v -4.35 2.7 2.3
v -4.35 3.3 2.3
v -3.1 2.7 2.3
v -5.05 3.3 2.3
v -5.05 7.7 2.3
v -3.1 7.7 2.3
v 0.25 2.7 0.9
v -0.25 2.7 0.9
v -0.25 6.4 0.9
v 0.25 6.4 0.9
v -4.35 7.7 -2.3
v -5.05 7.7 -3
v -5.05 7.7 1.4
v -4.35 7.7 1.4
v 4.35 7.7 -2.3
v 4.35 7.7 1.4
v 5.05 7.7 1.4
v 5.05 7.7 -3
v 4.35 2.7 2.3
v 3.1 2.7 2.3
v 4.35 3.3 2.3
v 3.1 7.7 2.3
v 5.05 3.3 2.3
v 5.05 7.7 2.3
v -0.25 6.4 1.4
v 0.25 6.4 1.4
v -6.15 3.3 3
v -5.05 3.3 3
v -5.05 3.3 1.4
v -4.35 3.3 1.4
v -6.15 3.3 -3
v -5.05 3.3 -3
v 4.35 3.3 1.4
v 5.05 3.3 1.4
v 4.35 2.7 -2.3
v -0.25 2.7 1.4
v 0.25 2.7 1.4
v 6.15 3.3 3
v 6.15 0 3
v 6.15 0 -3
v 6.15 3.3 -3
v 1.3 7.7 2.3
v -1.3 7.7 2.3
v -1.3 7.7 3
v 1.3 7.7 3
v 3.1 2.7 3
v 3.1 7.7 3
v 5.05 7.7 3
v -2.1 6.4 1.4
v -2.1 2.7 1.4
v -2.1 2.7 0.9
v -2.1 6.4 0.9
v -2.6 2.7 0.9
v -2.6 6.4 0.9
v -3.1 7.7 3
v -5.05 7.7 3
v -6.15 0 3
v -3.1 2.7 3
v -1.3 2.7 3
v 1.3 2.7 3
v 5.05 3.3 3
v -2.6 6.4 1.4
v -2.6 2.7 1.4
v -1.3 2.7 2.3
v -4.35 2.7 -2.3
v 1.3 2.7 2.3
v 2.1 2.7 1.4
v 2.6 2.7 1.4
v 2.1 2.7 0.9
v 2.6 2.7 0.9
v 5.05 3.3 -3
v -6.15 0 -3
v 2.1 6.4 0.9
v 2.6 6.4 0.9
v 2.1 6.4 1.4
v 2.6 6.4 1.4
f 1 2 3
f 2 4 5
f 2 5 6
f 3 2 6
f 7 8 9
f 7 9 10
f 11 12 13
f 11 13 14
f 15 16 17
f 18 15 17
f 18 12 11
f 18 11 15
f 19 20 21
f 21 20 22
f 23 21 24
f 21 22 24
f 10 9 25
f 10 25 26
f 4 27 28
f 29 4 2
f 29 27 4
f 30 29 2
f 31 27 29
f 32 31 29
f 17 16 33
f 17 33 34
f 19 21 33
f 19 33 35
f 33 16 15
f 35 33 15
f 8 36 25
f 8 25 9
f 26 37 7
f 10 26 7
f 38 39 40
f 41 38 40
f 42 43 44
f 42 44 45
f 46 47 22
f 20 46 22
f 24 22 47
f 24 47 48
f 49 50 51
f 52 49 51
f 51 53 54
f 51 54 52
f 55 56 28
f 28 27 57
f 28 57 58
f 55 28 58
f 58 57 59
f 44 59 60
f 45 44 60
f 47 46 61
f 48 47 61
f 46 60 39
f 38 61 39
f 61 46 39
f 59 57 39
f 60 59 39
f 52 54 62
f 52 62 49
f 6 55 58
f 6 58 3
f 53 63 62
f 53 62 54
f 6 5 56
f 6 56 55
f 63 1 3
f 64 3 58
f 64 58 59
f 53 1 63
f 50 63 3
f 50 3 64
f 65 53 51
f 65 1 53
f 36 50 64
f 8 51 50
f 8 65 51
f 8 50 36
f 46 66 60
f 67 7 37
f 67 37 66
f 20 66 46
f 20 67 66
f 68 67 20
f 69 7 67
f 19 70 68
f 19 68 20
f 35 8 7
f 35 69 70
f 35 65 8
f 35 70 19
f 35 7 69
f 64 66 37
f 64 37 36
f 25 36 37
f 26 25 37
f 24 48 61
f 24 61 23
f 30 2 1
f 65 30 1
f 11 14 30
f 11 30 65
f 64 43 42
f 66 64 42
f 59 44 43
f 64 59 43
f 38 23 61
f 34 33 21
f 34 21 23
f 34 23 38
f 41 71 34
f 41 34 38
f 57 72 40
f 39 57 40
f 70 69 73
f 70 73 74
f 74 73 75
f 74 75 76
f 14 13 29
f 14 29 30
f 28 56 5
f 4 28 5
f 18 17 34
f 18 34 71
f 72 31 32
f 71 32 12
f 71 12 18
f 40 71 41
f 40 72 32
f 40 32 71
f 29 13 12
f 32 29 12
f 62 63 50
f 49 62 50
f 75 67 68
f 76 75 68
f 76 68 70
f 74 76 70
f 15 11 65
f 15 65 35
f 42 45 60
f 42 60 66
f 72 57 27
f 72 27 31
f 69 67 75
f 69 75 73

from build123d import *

# Parameters (mm, degrees)
SKETCH1_W           = 12.3
SKETCH1_H           = 6
BOSS_EXTRUDE1_DEPTH = 7.7
SKETCH2_W           = 8.7
SKETCH2_H           = 4.6
CUT_EXTRUDE1_DEPTH  = 5
SKETCH3_W           = 1.1
SKETCH3_H           = 6
CUT_EXTRUDE2_DEPTH  = 4.4
SKETCH4_W           = 1.8
SKETCH4_H           = 0.7
CUT_EXTRUDE3_DEPTH  = 5
SKETCH5_W           = 10.1
SKETCH5_H           = 0.9
CUT_EXTRUDE4_DEPTH  = 4.4
SKETCH6_W           = 0.5
SKETCH6_H           = 0.5
BOSS_EXTRUDE2_DEPTH = 3.7


with BuildPart() as part:
    # Sketch1 → Boss-Extrude1 (new body)
    with BuildSketch(Plane(origin=(0, 0, 0), x_dir=(1, 0, 0), z_dir=(0, 1, 0))):
        Rectangle(SKETCH1_W, SKETCH1_H)
    extrude(amount=BOSS_EXTRUDE1_DEPTH)

    # Sketch2 → Cut-Extrude1 (cut)
    with BuildSketch(Plane(origin=(0, 7.7, 0), x_dir=(1, 0, 0), z_dir=(0, 1, 0))):
        Rectangle(SKETCH2_W, SKETCH2_H)
    extrude(amount=-CUT_EXTRUDE1_DEPTH, mode=Mode.SUBTRACT)

    # Sketch3 → Cut-Extrude2 (cut)
    with BuildSketch(Plane(origin=(0, 7.7, 0), x_dir=(1, 0, 0), z_dir=(0, 1, 0))):
        with Locations((-5.6, 0)):
            Rectangle(SKETCH3_W, SKETCH3_H)
        with Locations((5.6, 0)):
            Rectangle(SKETCH3_W, SKETCH3_H)
    extrude(amount=-CUT_EXTRUDE2_DEPTH, mode=Mode.SUBTRACT)

    # Sketch4 → Cut-Extrude3 (cut)
    with BuildSketch(Plane(origin=(0, 7.7, 0), x_dir=(1, 0, 0), z_dir=(0, 1, 0))):
        with Locations((-2.2, -2.65)):
            Rectangle(SKETCH4_W, SKETCH4_H)
        with Locations((2.2, -2.65)):
            Rectangle(SKETCH4_W, SKETCH4_H)
    extrude(amount=-CUT_EXTRUDE3_DEPTH, mode=Mode.SUBTRACT)

    # Sketch5 → Cut-Extrude4 (cut)
    with BuildSketch(Plane(origin=(0, 7.7, 0), x_dir=(1, 0, 0), z_dir=(0, 1, 0))):
        with Locations((0, -1.85)):
            Rectangle(SKETCH5_W, SKETCH5_H)
    extrude(amount=-CUT_EXTRUDE4_DEPTH, mode=Mode.SUBTRACT)

    # Sketch6 → Boss-Extrude2 (add)
    with BuildSketch(Plane(origin=(0, 2.7, 0), x_dir=(1, 0, 0), z_dir=(0, 1, 0))):
        with Locations((0, -1.15)):
            Rectangle(SKETCH6_W, SKETCH6_H)
        with Locations((-2.35, -1.15)):
            Rectangle(SKETCH6_W, SKETCH6_H)
        with Locations((2.35, -1.15)):
            Rectangle(SKETCH6_W, SKETCH6_H)
    extrude(amount=BOSS_EXTRUDE2_DEPTH)


solid = part.part
